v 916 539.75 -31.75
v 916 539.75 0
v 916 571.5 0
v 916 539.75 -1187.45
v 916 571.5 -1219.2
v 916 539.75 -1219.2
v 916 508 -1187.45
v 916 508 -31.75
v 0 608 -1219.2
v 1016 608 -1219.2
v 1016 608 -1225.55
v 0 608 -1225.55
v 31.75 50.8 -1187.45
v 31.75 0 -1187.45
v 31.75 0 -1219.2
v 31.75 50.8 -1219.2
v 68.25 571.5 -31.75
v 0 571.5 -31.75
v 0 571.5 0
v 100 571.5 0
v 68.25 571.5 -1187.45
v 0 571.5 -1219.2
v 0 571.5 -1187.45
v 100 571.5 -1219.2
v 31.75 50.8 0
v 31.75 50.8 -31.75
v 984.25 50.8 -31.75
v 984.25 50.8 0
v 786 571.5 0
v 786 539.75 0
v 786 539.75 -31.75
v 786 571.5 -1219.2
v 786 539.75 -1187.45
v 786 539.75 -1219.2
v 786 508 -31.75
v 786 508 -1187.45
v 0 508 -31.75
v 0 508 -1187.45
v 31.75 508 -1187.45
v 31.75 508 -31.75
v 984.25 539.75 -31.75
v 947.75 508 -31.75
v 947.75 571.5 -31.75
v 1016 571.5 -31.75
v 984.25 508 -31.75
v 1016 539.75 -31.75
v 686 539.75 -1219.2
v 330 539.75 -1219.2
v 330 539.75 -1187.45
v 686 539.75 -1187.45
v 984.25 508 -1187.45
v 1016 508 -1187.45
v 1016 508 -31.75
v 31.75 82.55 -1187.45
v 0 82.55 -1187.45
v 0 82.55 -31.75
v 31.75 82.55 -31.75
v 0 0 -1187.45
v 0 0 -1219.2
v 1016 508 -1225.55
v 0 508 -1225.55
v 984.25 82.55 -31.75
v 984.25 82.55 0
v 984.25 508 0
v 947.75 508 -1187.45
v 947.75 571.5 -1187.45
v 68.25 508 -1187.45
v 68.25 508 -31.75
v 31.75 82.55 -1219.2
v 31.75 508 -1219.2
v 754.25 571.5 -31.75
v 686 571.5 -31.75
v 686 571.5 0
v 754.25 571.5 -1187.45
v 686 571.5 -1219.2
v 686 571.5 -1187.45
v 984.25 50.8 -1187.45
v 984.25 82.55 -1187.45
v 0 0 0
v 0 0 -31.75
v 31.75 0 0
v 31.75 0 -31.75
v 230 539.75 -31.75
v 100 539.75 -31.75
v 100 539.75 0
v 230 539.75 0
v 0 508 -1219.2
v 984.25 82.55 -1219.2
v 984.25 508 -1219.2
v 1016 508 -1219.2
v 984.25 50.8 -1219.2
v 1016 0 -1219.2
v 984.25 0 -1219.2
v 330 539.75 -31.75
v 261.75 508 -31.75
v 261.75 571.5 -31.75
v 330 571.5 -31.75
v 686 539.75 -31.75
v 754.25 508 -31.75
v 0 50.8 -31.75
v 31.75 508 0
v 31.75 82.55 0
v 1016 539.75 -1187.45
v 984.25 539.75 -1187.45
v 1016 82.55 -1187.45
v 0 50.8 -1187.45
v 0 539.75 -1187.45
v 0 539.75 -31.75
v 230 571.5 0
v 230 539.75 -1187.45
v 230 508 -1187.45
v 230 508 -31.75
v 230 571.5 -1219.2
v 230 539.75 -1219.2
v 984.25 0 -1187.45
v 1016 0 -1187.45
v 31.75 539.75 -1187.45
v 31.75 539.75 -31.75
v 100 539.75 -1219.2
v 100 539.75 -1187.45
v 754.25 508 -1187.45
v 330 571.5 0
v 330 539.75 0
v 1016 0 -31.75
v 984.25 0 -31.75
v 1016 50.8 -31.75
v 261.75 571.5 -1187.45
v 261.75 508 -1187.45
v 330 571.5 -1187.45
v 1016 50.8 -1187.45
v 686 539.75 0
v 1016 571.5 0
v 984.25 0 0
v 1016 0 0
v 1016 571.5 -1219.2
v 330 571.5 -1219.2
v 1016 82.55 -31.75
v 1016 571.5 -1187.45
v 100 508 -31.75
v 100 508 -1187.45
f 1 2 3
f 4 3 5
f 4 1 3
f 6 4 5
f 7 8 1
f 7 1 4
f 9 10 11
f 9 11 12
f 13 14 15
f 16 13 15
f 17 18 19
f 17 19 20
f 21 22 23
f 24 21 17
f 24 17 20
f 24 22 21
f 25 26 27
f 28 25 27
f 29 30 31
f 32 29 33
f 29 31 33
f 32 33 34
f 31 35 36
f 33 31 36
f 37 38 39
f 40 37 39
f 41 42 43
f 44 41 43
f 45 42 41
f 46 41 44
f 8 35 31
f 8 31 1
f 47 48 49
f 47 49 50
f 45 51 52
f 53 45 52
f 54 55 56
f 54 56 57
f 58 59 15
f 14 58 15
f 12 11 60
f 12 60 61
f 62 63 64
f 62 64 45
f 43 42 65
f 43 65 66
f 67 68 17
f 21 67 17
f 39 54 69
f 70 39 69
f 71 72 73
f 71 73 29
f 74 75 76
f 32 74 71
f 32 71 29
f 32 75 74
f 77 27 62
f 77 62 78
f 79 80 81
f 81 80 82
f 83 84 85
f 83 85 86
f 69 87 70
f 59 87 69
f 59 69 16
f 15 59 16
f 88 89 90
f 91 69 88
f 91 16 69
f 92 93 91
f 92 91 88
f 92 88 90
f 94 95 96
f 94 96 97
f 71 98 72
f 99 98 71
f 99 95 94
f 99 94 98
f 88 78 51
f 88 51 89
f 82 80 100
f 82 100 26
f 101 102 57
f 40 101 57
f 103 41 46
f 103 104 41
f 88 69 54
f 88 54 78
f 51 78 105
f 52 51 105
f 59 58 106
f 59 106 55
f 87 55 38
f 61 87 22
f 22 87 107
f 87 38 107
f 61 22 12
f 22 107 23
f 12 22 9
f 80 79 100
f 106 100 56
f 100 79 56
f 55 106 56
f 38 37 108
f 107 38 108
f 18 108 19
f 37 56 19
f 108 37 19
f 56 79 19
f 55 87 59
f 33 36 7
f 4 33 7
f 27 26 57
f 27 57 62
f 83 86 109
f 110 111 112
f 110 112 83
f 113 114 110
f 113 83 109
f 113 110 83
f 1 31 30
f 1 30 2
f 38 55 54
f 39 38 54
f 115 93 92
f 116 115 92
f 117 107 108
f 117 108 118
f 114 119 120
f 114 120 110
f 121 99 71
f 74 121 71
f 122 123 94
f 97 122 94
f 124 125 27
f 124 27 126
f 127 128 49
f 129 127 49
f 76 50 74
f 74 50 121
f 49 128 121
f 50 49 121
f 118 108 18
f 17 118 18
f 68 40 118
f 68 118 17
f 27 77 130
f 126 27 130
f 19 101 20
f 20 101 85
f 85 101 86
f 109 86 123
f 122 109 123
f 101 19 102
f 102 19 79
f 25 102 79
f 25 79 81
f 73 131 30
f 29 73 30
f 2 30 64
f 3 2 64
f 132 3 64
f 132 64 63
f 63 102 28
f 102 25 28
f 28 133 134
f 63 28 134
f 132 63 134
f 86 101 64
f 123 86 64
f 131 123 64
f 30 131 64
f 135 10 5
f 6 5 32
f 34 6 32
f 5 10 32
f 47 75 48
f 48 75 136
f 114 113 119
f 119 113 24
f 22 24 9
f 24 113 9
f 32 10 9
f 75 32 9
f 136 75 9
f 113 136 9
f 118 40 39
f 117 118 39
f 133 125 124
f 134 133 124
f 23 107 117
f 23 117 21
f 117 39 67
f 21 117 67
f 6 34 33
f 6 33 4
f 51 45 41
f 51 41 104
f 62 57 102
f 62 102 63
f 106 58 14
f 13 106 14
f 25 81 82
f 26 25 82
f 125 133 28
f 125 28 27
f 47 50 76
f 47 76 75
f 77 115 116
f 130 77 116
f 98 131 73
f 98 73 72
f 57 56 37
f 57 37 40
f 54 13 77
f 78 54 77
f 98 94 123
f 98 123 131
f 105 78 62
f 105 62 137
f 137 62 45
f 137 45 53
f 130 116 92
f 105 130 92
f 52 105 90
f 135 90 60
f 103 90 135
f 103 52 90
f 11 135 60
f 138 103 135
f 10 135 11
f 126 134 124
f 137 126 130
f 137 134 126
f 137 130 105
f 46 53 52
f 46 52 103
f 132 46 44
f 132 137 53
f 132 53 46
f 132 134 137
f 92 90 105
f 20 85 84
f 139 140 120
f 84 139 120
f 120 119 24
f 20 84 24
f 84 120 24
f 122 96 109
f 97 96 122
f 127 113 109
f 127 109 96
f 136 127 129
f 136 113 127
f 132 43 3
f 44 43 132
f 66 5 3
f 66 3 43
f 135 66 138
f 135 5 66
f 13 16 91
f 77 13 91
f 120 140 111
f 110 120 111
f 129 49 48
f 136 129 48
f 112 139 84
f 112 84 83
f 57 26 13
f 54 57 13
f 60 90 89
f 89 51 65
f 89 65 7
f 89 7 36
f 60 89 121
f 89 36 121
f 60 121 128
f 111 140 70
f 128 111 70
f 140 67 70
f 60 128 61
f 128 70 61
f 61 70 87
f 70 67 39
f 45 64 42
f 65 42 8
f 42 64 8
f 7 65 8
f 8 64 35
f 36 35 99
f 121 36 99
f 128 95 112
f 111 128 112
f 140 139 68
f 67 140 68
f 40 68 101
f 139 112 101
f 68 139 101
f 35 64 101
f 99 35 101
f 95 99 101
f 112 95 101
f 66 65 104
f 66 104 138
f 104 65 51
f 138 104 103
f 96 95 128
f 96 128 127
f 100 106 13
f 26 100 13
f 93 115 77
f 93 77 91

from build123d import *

# Parameters (mm, degrees)
SKETCH2_W             = 31.75
SKETCH2_H             = 31.75
BOSS_EXTRUDE1_DEPTH   = 508
BOSS_EXTRUDE1_2_DEPTH = 508
BOSS_EXTRUDE1_3_DEPTH = 508
BOSS_EXTRUDE1_4_DEPTH = 508
SKETCH3_W             = 1016
SKETCH3_H             = 1219.2
SKETCH3_W_2           = 952.5
SKETCH3_H_2           = 1155.7
BOSS_EXTRUDE2_DEPTH   = 31.75
BOSS_EXTRUDE3_START   = -457.2
SKETCH3_2_W           = 1016
SKETCH3_2_H           = 1219.2
SKETCH3_2_W_2         = 952.5
SKETCH3_2_H_2         = 1155.7
BOSS_EXTRUDE3_DEPTH   = 31.75
SKETCH4_W             = 100
SKETCH4_H             = 31.75
BOSS_EXTRUDE4_DEPTH   = 31.75
SKETCH5_W             = 31.75
SKETCH5_H             = 63.5
BOSS_EXTRUDE5_DEPTH   = 1155.7
SKETCH6_W             = 1016
SKETCH6_H             = 100
BOSS_EXTRUDE6_DEPTH   = 6.35


with BuildPart() as part:
    # Sketch2 → Boss-Extrude1 (new body)
    with BuildSketch(Plane(origin=(0, 0, 0), x_dir=(1, 0, 0), z_dir=(0, 1, 0))):
        with Locations((15.875, 1203.325)):
            Rectangle(SKETCH2_W, SKETCH2_H)
    extrude(amount=BOSS_EXTRUDE1_DEPTH)



with BuildPart() as body_2:
    # Sketch2 → Boss-Extrude1 2 (new body)
    with BuildSketch(Plane(origin=(0, 0, 0), x_dir=(1, 0, 0), z_dir=(0, 1, 0))):
        with Locations((15.875, 15.875)):
            Rectangle(SKETCH2_W, SKETCH2_H)
    extrude(amount=BOSS_EXTRUDE1_2_DEPTH)


with BuildPart() as body_3:
    # Sketch2 → Boss-Extrude1 3 (new body)
    with BuildSketch(Plane(origin=(0, 0, 0), x_dir=(1, 0, 0), z_dir=(0, 1, 0))):
        with Locations((1000.125, 15.875)):
            Rectangle(SKETCH2_W, SKETCH2_H)
    extrude(amount=BOSS_EXTRUDE1_3_DEPTH)


with BuildPart() as body_4:
    # Sketch2 → Boss-Extrude1 4 (new body)
    with BuildSketch(Plane(origin=(0, 0, 0), x_dir=(1, 0, 0), z_dir=(0, 1, 0))):
        with Locations((1000.125, 1203.325)):
            Rectangle(SKETCH2_W, SKETCH2_H)
    extrude(amount=BOSS_EXTRUDE1_4_DEPTH)


with BuildPart() as part_1:
    add(part.part)

    add(body_2.part)  # Boss-Extrude2 merges body 2

    add(body_3.part)  # Boss-Extrude2 merges body 3

    add(body_4.part)  # Boss-Extrude2 merges body 4
    # Sketch3 → Boss-Extrude2 (add)
    with BuildSketch(Plane(origin=(0, 508, 0), x_dir=(1, 0, 0), z_dir=(0, 1, 0))):
        with Locations((508, 609.6)):
            Rectangle(SKETCH3_W, SKETCH3_H)
        with Locations((508, 609.6)):
            Rectangle(SKETCH3_W_2, SKETCH3_H_2, mode=Mode.SUBTRACT)
    extrude(amount=BOSS_EXTRUDE2_DEPTH)

    # Sketch3<2> → Boss-Extrude3 (add)
    with BuildSketch(Plane(origin=(0, 508, 0), x_dir=(1, 0, 0), z_dir=(0, 1, 0)).offset(BOSS_EXTRUDE3_START)):
        with Locations((508, 609.6)):
            Rectangle(SKETCH3_2_W, SKETCH3_2_H)
        with Locations((508, 609.6)):
            Rectangle(SKETCH3_2_W_2, SKETCH3_2_H_2, mode=Mode.SUBTRACT)
    extrude(amount=BOSS_EXTRUDE3_DEPTH)

    # Sketch4 → Boss-Extrude4 (add)
    with BuildSketch(Plane(origin=(0, 539.75, 0), x_dir=(1, 0, 0), z_dir=(0, 1, 0))):
        with Locations((50, 1203.325)):
            Rectangle(SKETCH4_W, SKETCH4_H)
        with Locations((280, 1203.325)):
            Rectangle(SKETCH4_W, SKETCH4_H)
        with Locations((966, 1203.325)):
            Rectangle(SKETCH4_W, SKETCH4_H)
        with Locations((736, 1203.325)):
            Rectangle(SKETCH4_W, SKETCH4_H)
        with Locations((736, 15.875)):
            Rectangle(SKETCH4_W, SKETCH4_H)
        with Locations((966, 15.875)):
            Rectangle(SKETCH4_W, SKETCH4_H)
        with Locations((280, 15.875)):
            Rectangle(SKETCH4_W, SKETCH4_H)
        with Locations((50, 15.875)):
            Rectangle(SKETCH4_W, SKETCH4_H)
    extrude(amount=BOSS_EXTRUDE4_DEPTH)

    # Sketch5 → Boss-Extrude5 (add)
    with BuildSketch(Plane.XY.offset(-1187.45)):
        with Locations((84.125, 539.75)):
            Rectangle(SKETCH5_W, SKETCH5_H)
        with Locations((245.875, 539.75)):
            Rectangle(SKETCH5_W, SKETCH5_H)
        with Locations((770.125, 539.75)):
            Rectangle(SKETCH5_W, SKETCH5_H)
        with Locations((931.875, 539.75)):
            Rectangle(SKETCH5_W, SKETCH5_H)
    extrude(amount=BOSS_EXTRUDE5_DEPTH)

    # Sketch6 → Boss-Extrude6 (add)
    with BuildSketch(Plane(origin=(0, 0, -1219.2), x_dir=(-1, 0, 0), z_dir=(0, 0, -1))):
        with Locations((-508, 558)):
            Rectangle(SKETCH6_W, SKETCH6_H)
    extrude(amount=BOSS_EXTRUDE6_DEPTH)


solid = part_1.part
